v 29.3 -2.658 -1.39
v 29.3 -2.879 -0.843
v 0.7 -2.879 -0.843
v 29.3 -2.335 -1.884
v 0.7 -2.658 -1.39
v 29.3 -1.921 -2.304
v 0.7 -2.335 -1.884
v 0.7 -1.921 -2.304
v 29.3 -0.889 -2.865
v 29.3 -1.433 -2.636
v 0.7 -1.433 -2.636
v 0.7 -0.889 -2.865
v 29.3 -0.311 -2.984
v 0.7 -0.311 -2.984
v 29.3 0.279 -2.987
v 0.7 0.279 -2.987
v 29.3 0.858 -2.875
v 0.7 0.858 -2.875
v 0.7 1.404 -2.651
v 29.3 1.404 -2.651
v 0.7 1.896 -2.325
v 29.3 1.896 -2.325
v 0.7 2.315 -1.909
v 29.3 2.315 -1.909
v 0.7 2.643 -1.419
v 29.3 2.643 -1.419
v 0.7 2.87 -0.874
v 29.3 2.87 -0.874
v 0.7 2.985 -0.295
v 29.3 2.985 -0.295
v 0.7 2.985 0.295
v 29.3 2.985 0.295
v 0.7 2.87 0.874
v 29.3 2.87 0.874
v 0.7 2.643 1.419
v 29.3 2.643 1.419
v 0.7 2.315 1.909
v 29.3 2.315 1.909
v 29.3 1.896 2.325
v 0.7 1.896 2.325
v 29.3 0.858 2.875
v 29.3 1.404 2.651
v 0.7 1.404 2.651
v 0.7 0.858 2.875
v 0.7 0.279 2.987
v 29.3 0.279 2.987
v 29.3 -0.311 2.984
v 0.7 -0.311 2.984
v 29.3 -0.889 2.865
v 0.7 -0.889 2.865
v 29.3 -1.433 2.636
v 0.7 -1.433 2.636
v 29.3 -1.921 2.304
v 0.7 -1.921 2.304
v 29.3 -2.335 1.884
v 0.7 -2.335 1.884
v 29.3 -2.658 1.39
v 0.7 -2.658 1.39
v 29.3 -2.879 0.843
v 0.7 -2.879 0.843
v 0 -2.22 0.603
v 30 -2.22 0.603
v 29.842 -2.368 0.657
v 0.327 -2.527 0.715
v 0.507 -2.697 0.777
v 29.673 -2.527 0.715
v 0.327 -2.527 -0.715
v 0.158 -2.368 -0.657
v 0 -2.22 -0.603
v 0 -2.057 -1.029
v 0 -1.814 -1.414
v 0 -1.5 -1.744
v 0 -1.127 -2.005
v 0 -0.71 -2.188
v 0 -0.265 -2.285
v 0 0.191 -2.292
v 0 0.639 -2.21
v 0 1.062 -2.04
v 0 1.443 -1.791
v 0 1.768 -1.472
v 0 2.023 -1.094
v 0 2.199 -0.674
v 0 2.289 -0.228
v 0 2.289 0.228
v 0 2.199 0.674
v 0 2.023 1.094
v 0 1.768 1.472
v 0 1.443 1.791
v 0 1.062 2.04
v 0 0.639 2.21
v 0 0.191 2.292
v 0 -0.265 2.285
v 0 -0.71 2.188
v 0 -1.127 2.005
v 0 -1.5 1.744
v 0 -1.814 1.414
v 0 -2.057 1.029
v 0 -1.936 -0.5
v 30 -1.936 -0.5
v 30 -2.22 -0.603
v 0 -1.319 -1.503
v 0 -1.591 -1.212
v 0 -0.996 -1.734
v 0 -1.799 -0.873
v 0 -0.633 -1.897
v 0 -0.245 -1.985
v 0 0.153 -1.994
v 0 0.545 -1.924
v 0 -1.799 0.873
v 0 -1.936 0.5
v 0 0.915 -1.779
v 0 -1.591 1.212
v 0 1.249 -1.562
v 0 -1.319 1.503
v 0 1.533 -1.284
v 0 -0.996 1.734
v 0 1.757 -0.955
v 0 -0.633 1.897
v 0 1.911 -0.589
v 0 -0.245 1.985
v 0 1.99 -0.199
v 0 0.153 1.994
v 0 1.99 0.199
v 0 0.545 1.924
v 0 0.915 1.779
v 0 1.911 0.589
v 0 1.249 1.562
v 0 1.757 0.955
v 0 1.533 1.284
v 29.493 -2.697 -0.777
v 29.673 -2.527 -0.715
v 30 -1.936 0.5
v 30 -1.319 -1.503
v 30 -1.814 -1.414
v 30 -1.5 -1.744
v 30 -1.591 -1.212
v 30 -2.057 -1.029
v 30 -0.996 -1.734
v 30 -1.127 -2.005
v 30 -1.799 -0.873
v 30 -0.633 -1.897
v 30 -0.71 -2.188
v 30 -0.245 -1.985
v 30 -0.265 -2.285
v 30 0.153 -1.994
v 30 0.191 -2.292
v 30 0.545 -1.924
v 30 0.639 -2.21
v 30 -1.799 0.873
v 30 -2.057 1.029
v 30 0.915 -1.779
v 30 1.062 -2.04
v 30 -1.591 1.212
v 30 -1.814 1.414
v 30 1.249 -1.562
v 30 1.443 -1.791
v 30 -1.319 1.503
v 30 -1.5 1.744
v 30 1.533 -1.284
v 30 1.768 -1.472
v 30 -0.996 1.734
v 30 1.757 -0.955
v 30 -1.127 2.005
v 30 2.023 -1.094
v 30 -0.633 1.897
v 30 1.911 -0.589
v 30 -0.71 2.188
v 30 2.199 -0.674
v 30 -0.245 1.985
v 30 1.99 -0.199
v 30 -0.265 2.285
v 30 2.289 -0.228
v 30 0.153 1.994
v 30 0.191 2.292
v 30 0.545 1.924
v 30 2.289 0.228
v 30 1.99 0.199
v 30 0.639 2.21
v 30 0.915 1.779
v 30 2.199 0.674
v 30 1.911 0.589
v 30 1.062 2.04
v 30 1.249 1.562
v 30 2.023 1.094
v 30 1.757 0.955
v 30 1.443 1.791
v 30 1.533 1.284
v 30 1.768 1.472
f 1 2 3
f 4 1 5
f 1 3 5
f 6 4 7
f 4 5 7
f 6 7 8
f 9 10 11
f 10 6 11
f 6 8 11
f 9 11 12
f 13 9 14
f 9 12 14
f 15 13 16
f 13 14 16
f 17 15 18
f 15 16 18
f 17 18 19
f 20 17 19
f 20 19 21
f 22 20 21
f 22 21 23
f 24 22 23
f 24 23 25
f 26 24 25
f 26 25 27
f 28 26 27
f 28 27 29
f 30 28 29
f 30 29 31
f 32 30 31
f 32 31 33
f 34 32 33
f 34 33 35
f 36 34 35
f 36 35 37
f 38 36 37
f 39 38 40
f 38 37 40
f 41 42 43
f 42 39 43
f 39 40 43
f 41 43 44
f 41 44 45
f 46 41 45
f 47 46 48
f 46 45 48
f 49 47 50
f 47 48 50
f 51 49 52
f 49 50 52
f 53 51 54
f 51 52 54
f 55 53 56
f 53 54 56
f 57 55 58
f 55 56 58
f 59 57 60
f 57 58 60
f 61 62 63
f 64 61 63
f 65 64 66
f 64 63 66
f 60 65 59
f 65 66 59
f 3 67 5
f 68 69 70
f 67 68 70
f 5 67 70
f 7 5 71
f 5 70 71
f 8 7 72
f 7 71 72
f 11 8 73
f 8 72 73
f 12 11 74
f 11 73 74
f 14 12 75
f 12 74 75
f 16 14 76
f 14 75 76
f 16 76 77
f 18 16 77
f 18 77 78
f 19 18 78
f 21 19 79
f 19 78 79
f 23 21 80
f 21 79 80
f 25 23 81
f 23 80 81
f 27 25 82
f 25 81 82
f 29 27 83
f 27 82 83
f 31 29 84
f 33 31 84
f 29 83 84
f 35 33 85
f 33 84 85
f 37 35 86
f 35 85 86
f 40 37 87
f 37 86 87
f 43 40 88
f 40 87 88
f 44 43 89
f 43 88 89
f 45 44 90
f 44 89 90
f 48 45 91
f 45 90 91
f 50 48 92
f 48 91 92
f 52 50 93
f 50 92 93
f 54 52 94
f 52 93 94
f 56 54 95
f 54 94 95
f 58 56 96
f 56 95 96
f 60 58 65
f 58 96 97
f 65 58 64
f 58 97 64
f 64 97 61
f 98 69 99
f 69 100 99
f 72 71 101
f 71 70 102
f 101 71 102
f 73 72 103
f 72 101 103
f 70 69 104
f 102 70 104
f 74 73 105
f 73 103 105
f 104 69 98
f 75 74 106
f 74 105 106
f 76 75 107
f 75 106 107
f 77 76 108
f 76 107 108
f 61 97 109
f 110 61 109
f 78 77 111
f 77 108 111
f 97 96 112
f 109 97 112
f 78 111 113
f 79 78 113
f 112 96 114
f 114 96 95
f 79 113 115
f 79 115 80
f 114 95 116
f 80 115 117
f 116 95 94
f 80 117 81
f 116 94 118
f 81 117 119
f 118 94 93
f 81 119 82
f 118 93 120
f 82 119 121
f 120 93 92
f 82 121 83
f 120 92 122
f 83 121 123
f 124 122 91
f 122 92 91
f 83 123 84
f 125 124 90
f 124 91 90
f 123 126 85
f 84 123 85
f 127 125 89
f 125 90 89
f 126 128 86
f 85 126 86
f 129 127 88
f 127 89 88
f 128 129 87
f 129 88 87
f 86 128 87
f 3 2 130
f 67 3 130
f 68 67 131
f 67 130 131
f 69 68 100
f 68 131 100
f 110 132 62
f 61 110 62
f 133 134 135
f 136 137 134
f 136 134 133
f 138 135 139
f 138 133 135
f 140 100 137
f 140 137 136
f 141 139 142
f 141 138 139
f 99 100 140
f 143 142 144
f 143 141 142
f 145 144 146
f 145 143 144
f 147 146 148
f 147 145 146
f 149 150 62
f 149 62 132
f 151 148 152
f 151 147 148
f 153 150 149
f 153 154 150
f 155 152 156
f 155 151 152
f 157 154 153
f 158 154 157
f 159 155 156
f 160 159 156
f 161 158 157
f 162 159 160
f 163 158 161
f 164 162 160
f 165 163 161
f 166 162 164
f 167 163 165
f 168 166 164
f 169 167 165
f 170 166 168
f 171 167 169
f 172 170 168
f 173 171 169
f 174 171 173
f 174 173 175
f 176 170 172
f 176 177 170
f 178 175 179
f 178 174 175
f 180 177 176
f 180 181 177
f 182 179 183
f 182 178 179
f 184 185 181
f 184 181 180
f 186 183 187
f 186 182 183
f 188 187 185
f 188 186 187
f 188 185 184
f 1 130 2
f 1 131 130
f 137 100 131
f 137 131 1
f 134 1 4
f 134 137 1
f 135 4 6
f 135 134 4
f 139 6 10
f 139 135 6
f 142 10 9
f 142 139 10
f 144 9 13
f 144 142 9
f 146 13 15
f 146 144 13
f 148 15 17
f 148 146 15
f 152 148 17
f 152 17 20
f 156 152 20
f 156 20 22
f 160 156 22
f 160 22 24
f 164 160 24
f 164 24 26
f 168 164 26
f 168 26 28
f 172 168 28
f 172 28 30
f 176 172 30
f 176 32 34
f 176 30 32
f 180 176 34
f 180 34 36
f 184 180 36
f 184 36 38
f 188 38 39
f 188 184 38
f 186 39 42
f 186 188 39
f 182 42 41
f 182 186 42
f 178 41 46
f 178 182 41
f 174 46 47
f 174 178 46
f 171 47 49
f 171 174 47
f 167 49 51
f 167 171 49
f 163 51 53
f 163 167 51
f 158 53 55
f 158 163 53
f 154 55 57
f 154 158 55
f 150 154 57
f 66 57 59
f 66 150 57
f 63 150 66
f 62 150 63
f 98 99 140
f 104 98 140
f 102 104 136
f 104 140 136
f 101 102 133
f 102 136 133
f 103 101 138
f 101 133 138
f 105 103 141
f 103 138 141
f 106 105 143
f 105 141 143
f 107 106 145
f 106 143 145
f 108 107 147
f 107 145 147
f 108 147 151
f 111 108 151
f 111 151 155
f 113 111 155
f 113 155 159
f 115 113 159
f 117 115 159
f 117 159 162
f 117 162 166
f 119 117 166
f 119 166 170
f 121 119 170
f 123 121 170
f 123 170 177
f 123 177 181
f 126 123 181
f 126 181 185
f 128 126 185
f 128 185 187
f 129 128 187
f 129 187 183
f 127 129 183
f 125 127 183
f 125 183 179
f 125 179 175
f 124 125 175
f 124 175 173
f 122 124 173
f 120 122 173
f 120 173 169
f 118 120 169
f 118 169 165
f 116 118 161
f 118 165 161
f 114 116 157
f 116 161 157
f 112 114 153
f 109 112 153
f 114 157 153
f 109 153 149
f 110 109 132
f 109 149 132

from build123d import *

# Parameters (mm, degrees)
F0_R     = 3
F1_DEPTH = 30
F2_SIZE  = 0.7
F4_DEPTH = 31


with BuildPart() as f1:
    # F0 (on Right) → F1 (new body)
    with BuildSketch(Plane.YZ):
        Circle(F0_R)
    extrude(amount=F1_DEPTH)

    # F2
    f2_edges = [f1.edges().sort_by_distance(p)[0] for p in [
        (30, -3, 0),
        (0, -3, 0),
    ]]
    chamfer(f2_edges, length=F2_SIZE)

    # F3 (on face) → F4 (cut)
    with BuildSketch(Plane.YZ.offset(30)):
        with BuildLine():
            Line((-3.31023, -1), (-2.219542, -0.603022))
            ThreePointArc((-2.219542, -0.603022), (-2.3, 0), (-2.219542, 0.603022))
            Line((-2.219542, 0.603022), (-3.31023, 1))
            Line((-3.31023, 1), (-3.31023, -1))
        make_face()
        with BuildLine():
            Line((-2.219542, -0.603022), (-1.936492, -0.5))
            ThreePointArc((-1.936492, -0.5), (2, 0), (-1.936492, 0.5))
            Line((-1.936492, 0.5), (-2.219542, 0.603022))
            ThreePointArc((-2.219542, 0.603022), (-2.3, 0), (-2.219542, -0.603022))
        make_face()
    extrude(amount=-F4_DEPTH, mode=Mode.SUBTRACT)


solid = f1.part
